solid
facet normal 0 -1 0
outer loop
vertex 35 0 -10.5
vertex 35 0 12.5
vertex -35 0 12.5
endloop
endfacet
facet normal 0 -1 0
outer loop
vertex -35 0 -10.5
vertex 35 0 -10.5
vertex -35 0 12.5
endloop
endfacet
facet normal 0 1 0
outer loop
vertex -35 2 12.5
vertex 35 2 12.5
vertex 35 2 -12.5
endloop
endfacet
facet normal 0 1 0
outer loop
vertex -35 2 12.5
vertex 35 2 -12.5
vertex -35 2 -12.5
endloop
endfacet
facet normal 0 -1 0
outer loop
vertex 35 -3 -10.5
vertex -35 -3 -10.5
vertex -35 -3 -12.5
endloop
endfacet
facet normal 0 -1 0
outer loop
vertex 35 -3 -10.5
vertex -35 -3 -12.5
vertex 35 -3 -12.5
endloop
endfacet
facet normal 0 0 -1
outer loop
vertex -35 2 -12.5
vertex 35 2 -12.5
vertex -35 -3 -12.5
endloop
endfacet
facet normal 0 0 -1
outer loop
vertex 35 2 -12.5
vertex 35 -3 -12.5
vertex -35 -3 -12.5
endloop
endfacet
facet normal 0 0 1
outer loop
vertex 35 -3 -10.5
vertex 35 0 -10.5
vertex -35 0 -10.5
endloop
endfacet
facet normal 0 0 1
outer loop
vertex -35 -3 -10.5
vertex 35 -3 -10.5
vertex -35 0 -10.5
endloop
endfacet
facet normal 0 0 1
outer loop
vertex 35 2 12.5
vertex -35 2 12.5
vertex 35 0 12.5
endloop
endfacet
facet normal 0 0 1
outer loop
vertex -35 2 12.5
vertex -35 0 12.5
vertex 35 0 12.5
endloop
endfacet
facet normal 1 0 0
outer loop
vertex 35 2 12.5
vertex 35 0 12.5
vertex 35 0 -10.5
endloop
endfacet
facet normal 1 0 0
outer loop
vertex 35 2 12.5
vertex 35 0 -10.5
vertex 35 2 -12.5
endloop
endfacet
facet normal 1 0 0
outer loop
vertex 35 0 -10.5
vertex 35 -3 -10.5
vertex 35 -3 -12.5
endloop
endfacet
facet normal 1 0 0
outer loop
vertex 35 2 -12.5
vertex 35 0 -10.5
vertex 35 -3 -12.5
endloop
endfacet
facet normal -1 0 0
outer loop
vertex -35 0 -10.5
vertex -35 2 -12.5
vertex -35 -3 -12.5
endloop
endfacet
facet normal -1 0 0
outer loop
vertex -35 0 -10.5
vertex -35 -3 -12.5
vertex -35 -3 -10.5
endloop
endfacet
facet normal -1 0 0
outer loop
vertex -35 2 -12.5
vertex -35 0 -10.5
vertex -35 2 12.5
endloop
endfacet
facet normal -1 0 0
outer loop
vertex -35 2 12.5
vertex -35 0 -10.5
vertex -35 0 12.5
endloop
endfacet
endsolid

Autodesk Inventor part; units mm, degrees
ref_plane "YZ Plane" through (0, 0, 0) normal (1, 0, 0) x (0, 1, 0)
ref_plane "XZ Plane" through (0, 0, 0) normal (0, 1, 0) x (-1, 0, 0)
ref_plane "XY Plane" through (0, 0, 0) normal (0, 0, 1) x (1, 0, 0)
sketch "Sketch1" plane through (0, 0, 0) normal (0, 1, 0) x (-1, 0, 0)
  line L0 (35, 12.5) -> (-35, 12.5)
  line L1 (-35, 12.5) -> (-35, -12.5)
  line L2 (-35, -12.5) -> (35, -12.5)
  line L3 (35, -12.5) -> (35, 12.5)
  line L4 (35, 12.5) -> (-35, -12.5) construction
  line L5 (-35, 12.5) -> (35, -12.5) construction
  point P0 (0, 0)
  dimension "d0" = 70
  dimension "d1" = 25
extrude "Extrusion1" add sketch "Sketch1" along normal blind 2
sketch "Sketch2" plane through (0, 0, 0) normal (0, -1, 0) x (1, 0, 0)
  line L0 (35, 12.5) -> (35, -12.5) projected
  line L1 (35, -12.5) -> (-35, -12.5) projected
  line L2 (-35, -12.5) -> (35, -12.5)
  line L3 (35, -12.5) -> (35, -10.5)
  line L4 (35, -10.5) -> (-35, -10.5)
  line L5 (-35, -10.5) -> (-35, -12.5)
  point P0 (0, 0)
  dimension "d7" = 2
extrude "Extrusion2" add sketch "Sketch2" along normal blind 3
properties part number "SP46V1 Felpa Roldana" material "Fabric"
